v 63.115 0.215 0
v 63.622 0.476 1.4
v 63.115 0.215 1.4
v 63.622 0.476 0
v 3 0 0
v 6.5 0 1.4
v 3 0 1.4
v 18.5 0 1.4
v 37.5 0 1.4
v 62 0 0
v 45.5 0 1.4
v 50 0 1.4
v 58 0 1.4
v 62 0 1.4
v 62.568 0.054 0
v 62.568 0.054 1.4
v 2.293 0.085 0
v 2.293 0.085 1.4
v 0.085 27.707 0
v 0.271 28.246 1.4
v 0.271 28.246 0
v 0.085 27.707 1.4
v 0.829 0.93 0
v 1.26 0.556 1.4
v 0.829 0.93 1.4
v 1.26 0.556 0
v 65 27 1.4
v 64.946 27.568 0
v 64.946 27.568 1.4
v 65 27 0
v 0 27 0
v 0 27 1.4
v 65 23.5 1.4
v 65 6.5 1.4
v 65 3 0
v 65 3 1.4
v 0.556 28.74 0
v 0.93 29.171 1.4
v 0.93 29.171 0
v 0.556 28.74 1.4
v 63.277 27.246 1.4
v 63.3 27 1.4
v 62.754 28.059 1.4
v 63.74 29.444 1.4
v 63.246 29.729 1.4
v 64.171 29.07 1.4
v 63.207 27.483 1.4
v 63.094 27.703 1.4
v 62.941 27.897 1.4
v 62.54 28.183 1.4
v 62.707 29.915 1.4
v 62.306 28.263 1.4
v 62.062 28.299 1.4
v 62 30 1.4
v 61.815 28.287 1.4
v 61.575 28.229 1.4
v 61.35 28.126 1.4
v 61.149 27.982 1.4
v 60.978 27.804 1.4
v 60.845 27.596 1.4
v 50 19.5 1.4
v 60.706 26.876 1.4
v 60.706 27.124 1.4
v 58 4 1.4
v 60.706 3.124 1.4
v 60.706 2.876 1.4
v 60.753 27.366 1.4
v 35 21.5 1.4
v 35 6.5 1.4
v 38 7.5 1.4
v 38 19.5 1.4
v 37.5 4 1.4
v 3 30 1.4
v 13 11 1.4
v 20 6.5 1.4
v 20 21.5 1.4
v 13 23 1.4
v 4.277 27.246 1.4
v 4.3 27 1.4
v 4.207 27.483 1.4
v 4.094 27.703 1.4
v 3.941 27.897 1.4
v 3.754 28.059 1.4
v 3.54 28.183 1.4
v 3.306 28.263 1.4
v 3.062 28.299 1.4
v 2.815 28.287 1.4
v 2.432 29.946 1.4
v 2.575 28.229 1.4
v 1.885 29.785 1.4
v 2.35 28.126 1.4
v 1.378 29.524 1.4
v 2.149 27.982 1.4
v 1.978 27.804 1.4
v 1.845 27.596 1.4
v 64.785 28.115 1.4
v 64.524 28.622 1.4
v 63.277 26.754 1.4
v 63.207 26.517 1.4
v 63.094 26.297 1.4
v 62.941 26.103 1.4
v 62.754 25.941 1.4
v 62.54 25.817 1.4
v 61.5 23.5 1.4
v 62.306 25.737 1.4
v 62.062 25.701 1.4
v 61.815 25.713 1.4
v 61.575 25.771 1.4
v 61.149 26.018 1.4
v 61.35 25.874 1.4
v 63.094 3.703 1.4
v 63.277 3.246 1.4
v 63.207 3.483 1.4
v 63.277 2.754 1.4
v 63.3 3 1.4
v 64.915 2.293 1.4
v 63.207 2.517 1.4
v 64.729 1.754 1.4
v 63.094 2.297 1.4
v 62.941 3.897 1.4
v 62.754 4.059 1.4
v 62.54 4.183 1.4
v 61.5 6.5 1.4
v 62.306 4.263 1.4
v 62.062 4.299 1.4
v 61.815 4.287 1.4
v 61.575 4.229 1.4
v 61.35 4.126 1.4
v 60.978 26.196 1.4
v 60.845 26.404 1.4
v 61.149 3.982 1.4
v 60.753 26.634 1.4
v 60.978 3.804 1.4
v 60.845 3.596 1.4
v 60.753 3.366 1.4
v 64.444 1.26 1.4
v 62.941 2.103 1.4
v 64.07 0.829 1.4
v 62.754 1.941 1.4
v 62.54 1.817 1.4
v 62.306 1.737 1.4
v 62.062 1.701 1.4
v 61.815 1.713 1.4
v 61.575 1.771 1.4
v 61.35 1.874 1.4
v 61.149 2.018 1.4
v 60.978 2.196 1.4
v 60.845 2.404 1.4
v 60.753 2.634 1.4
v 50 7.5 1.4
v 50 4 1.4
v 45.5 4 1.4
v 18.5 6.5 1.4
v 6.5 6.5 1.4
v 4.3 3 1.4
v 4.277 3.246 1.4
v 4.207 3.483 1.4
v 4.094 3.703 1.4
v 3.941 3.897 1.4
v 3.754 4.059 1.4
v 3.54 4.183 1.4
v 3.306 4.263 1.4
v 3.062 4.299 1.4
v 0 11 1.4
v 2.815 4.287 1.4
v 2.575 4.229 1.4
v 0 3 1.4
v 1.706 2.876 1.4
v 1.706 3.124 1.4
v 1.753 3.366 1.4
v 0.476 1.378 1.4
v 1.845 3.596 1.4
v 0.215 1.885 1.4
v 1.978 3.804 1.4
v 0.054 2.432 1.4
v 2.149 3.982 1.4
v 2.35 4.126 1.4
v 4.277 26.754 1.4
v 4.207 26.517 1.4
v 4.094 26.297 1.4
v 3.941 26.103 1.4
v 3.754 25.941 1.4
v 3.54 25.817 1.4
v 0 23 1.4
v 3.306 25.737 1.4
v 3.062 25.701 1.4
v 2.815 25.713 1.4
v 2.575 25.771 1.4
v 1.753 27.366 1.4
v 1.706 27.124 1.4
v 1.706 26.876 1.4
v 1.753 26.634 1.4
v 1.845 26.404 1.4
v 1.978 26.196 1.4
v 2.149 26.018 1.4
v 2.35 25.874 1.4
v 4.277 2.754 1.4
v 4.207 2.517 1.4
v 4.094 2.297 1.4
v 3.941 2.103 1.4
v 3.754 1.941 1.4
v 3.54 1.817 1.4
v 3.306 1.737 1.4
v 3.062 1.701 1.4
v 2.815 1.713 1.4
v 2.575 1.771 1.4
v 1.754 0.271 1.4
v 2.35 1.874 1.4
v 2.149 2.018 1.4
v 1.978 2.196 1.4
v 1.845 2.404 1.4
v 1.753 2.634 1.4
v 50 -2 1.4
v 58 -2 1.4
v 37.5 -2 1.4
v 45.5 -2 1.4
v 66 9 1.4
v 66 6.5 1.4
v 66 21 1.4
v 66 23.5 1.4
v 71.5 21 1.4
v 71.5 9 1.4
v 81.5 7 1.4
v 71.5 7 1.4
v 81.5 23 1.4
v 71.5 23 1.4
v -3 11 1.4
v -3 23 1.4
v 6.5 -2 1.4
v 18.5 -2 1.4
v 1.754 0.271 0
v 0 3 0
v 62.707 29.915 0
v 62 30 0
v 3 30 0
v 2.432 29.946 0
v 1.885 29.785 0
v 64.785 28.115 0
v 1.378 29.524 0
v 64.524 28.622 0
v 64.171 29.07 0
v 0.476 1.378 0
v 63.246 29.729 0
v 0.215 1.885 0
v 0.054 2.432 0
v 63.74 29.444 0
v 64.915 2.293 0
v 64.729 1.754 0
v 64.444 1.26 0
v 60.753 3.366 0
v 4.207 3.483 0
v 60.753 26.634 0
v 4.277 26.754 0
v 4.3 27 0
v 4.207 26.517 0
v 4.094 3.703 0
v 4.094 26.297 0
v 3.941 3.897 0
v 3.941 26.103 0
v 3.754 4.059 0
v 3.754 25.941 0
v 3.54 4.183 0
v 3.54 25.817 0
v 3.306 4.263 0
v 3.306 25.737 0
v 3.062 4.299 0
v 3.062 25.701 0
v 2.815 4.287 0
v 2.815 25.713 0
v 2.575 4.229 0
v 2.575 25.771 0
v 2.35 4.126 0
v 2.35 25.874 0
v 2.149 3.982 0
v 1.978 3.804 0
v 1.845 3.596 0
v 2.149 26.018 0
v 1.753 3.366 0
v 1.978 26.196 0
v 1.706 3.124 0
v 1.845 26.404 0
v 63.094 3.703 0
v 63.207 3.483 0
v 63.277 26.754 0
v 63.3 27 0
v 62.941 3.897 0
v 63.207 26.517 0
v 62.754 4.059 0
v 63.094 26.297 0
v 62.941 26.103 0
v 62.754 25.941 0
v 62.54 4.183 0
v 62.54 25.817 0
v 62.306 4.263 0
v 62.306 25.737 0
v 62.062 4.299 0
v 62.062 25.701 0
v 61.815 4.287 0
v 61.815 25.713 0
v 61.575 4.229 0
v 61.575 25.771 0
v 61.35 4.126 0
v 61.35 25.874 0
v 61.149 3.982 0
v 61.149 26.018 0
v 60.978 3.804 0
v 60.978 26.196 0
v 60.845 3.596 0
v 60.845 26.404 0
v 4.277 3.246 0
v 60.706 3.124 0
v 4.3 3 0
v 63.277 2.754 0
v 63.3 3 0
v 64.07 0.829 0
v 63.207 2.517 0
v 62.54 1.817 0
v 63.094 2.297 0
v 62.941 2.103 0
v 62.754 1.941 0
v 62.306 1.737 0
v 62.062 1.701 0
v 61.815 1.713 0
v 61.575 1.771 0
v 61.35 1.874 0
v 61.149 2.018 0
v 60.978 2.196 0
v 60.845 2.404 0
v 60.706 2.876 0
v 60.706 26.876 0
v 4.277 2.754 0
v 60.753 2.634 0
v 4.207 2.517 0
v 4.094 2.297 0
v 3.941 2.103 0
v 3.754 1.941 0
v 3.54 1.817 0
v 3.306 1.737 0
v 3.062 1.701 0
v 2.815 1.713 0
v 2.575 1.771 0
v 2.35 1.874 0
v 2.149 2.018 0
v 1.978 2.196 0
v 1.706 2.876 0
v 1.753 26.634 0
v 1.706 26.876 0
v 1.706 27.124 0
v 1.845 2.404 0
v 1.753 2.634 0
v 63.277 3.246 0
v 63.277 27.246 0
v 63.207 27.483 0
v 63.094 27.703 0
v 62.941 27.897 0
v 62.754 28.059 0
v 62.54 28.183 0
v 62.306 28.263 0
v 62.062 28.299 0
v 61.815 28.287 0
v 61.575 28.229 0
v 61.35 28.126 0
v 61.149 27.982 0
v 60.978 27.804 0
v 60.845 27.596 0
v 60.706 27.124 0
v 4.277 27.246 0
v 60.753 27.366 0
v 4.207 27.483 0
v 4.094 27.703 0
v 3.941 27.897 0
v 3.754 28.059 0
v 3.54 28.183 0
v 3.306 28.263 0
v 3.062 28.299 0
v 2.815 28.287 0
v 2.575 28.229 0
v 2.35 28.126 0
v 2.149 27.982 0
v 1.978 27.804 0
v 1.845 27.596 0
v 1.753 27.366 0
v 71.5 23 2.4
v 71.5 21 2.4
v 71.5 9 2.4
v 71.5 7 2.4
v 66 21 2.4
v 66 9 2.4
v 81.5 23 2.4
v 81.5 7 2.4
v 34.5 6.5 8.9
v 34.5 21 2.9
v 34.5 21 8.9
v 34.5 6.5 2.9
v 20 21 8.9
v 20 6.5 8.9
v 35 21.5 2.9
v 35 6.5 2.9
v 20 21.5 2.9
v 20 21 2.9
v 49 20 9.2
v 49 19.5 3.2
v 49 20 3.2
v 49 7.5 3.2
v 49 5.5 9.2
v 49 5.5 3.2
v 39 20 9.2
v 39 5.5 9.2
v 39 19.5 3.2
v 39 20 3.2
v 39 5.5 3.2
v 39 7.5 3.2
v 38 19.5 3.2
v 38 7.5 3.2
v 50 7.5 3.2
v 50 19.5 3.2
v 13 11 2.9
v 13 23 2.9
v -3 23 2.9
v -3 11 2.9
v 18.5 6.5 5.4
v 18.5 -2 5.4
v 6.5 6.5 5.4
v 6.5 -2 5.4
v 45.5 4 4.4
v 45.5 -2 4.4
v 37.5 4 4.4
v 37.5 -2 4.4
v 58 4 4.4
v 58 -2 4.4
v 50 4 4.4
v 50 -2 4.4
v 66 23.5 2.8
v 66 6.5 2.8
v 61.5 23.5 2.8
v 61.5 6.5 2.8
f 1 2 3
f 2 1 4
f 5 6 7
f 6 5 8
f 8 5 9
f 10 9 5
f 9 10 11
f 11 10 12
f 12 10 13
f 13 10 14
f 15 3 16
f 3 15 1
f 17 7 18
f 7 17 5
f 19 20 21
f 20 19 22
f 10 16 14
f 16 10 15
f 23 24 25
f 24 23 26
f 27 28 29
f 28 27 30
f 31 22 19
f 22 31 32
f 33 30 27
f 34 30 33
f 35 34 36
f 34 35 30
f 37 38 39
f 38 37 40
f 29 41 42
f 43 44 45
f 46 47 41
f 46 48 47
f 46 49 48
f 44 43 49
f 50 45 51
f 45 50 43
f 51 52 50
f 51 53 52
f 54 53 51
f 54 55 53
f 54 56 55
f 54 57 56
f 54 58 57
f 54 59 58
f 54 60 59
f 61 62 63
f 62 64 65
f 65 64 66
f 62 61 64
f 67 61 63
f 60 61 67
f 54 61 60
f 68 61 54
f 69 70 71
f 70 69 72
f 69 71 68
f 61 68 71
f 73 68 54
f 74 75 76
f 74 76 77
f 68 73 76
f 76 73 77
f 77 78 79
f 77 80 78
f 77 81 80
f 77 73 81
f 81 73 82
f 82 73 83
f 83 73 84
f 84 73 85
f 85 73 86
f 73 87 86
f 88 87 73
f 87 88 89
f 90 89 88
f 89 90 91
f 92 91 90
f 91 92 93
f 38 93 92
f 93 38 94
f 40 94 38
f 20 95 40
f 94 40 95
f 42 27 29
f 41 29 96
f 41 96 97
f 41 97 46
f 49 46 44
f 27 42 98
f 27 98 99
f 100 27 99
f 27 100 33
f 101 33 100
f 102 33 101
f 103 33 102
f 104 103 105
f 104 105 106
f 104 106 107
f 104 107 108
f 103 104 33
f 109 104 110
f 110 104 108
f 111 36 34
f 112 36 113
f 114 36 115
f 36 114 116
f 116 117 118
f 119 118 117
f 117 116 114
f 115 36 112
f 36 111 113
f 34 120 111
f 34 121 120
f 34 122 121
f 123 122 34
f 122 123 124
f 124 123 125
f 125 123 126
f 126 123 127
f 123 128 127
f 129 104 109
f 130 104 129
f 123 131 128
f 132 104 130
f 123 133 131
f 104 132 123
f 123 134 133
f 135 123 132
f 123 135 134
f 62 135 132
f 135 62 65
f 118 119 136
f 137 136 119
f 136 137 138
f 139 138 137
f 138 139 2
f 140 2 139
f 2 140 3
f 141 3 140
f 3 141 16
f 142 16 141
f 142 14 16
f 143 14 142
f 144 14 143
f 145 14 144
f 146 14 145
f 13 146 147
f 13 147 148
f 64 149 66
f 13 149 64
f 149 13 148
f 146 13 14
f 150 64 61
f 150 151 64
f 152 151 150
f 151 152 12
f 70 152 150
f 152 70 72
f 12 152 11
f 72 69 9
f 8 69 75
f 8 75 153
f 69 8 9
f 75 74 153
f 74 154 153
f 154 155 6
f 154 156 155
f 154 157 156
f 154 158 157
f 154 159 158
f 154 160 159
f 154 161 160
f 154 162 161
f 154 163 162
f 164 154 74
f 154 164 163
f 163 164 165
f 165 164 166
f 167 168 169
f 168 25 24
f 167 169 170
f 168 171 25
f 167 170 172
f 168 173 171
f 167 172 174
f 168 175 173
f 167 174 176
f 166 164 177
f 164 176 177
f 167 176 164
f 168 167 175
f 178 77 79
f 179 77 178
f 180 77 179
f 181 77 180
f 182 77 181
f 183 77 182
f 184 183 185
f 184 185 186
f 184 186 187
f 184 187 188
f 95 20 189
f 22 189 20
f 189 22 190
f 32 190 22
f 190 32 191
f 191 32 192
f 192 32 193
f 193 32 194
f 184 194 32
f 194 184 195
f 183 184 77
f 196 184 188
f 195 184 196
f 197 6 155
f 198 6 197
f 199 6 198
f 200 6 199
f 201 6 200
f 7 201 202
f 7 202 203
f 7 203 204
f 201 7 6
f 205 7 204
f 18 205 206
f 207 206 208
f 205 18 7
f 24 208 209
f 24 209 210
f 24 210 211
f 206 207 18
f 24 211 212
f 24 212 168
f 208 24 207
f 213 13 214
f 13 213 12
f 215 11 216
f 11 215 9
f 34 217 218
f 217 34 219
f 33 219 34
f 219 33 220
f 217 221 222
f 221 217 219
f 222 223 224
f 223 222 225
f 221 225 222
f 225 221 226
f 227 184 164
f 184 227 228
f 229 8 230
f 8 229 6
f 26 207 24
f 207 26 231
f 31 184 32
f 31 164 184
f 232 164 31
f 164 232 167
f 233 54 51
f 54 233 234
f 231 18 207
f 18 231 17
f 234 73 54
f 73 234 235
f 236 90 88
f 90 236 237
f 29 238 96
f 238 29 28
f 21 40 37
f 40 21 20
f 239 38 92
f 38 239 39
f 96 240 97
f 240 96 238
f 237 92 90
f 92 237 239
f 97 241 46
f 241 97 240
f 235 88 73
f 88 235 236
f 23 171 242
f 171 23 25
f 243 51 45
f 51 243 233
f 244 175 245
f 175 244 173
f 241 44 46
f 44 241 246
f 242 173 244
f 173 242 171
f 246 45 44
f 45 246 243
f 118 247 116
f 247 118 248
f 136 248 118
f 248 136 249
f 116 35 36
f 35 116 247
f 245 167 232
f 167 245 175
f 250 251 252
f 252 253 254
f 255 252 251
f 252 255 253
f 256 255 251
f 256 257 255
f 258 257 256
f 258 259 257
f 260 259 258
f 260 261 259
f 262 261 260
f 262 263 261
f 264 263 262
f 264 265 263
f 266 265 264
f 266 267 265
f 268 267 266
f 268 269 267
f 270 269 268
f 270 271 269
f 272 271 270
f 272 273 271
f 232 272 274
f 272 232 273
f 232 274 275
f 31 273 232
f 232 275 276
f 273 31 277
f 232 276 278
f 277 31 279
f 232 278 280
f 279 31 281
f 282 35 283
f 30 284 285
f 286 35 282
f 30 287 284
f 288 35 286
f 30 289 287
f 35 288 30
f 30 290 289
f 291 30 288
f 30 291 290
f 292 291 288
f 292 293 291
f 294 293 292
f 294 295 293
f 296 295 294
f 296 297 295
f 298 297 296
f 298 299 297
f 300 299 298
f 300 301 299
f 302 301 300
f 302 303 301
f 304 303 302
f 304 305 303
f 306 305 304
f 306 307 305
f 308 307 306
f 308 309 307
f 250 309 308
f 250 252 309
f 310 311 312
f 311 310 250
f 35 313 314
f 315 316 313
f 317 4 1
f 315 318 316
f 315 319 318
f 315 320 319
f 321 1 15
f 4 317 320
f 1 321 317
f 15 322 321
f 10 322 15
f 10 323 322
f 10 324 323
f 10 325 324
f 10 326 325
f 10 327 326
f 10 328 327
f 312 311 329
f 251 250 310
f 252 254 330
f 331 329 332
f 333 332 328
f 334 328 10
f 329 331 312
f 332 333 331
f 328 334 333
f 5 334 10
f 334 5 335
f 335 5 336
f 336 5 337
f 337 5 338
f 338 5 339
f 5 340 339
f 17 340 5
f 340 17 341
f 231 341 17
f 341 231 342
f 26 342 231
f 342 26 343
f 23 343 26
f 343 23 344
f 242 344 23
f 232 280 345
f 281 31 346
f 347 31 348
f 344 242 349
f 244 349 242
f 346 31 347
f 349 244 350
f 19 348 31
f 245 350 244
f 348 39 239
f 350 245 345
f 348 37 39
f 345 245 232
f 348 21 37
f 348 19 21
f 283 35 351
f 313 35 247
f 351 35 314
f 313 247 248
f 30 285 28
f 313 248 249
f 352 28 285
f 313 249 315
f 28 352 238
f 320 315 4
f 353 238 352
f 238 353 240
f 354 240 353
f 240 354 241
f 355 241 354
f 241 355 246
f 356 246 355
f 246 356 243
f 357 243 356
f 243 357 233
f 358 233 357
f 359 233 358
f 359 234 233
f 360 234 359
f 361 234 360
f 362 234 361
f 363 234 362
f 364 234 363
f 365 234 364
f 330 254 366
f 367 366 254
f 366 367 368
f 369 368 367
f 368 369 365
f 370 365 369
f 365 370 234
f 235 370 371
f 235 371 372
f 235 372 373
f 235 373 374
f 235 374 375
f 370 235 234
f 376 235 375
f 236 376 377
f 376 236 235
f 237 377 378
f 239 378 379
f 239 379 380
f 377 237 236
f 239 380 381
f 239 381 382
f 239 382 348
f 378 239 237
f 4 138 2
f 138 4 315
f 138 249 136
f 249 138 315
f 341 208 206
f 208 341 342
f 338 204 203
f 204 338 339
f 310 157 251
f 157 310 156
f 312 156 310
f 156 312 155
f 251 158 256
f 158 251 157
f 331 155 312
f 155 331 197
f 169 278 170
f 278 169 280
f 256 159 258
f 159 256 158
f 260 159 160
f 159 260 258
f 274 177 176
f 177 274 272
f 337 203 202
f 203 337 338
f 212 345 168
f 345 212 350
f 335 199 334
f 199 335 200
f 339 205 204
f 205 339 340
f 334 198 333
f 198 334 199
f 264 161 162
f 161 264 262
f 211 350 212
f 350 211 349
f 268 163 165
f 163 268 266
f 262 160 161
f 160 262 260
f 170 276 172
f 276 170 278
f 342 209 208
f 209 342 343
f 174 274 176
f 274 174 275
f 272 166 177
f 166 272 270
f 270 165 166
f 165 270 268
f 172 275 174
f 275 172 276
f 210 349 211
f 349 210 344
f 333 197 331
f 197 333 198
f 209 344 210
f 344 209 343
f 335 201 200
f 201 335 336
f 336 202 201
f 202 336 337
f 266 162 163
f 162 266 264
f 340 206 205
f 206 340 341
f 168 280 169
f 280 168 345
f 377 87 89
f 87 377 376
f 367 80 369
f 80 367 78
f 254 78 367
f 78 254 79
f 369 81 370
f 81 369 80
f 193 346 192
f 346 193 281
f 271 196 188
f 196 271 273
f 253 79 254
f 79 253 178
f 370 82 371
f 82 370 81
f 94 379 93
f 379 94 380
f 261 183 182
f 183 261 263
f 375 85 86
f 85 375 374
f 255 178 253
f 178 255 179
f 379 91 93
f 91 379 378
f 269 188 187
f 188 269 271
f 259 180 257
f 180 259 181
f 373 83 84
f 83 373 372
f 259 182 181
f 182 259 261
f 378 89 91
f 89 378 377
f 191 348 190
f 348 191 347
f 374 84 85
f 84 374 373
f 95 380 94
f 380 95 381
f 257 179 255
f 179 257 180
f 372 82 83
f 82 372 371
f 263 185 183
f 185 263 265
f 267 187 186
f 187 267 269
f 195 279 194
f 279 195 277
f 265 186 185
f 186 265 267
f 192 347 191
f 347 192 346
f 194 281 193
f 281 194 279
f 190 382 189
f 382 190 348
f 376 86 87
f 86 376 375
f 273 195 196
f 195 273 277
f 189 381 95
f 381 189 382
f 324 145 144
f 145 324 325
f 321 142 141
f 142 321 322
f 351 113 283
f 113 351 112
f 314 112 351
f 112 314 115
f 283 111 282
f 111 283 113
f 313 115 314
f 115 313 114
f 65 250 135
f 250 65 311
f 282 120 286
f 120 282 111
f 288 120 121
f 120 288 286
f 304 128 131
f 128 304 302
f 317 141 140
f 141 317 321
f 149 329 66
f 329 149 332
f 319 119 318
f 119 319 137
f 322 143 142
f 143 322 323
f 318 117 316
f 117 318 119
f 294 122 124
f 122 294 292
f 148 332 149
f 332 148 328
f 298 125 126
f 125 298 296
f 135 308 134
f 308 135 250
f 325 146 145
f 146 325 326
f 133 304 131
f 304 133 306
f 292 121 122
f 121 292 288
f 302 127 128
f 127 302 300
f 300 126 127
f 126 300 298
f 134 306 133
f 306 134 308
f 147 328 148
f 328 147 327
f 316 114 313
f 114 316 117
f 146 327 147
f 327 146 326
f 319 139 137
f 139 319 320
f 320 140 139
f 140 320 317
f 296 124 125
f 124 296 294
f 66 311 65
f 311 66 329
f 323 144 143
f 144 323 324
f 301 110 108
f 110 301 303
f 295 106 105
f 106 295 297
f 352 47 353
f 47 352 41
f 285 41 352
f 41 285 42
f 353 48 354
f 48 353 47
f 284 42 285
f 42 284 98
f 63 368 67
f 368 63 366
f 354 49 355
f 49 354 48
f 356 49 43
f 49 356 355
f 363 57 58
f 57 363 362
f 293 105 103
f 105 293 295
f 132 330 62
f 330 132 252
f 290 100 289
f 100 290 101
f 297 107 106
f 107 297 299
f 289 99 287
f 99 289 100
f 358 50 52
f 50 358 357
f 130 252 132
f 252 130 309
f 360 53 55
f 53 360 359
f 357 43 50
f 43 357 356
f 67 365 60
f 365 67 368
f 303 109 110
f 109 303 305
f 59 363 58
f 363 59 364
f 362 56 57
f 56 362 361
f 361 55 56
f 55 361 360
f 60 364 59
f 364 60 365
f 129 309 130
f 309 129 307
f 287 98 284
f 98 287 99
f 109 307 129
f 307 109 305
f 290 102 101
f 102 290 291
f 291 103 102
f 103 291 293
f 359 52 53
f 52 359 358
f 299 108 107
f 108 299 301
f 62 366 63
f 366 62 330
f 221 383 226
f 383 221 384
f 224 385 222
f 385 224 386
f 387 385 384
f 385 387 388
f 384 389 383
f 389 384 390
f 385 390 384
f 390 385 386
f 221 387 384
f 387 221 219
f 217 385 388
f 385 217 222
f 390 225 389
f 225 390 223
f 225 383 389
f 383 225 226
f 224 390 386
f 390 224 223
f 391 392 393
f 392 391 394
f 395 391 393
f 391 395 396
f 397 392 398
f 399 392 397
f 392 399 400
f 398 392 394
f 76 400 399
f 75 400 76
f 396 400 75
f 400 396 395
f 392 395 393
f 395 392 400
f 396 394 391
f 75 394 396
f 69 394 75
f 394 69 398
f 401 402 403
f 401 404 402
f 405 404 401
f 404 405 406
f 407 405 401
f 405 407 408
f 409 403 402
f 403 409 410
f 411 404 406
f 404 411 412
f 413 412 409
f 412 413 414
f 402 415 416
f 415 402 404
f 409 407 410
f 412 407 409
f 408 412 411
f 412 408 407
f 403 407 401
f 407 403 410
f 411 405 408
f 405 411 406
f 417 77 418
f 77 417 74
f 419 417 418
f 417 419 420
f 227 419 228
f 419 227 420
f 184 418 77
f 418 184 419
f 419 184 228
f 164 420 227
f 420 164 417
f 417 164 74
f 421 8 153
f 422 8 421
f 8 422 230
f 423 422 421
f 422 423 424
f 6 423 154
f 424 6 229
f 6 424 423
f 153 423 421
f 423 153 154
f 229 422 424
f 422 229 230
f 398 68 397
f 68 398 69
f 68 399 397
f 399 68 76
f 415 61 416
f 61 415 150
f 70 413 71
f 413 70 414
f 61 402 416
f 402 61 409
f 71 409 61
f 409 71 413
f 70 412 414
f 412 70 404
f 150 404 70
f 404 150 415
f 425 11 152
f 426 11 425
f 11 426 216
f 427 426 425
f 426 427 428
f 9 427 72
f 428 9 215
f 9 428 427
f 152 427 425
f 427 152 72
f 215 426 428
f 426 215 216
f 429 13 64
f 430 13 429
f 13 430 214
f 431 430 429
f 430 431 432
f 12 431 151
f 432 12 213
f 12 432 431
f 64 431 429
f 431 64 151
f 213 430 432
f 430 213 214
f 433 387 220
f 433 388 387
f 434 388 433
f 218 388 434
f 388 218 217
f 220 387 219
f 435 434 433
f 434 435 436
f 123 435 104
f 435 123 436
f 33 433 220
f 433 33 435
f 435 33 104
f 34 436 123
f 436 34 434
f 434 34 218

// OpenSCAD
//======================================================================
// pi0.scad
//
// This is a Raspberry Pi Zero W 2
// Beware that heat sinks may be slightly misplaced, leave extra space!
// TODO: Mounting holes are off a bit.
//
// DrTomFlint, 19 Oct 2024
//======================================================================

rPi=3.0;       // radius of pcb corners
thick=1.4;    // pcb thickness
xPi=65.0;
yPi=30.0;  

F2=33;

//----------------------------------------------------------------------
module pi0(cam=10,heatsink=1){

  
  // pcb
  translate([rPi,rPi,0])
  difference(){
    linear_extrude(height=thick)
    offset(r=rPi,$fn=F2)
    square([xPi-2*rPi,yPi-2*rPi]);

    // mounting holes  
    translate([0,0,0])
    cylinder(r=1.3,h=4*thick,center=true,$fn=F2);
    translate([0,yPi-2*rPi,0])
    cylinder(r=1.3,h=4*thick,center=true,$fn=F2);
    translate([xPi-2*rPi,0,0])
    cylinder(r=1.3,h=4*thick,center=true,$fn=F2);
    translate([xPi-2*rPi,yPi-2*rPi,0])
    cylinder(r=1.3,h=4*thick,center=true,$fn=F2);
  }
  
  // SD card
  translate([-3,11,thick])
  cube([16,12,1.5]);
  
  // HDMI
  translate([6.5,-2,thick])
  cube([12,8.5,4]);
  
  // RP3A0-AU Processor
  translate([20,6.5,thick])
  cube([15,15,1.5]);
  
  // RF chip
  translate([38,7.5,thick])
  cube([12,12,1.8]);
  
  // USB OTG
  translate([37.5,-2,thick])
  cube([8,6,3]);
  
  // USB Power
  translate([50,-2,thick])
  cube([8,6,3]);
  
  // CSI 
  translate([61.5,6.5,thick])
  cube([4.5,17,1.4]);
  
  // Camera cable
  if(cam>0){
    // narrow section
    translate([xPi,9,thick])
    cube([6.5,12,1]);    
    // wider section
    translate([xPi+6.5,7,thick])
    cube([cam,16,1]);    
  }
  
  // 
  if(heatsink==1){
    // Processor heatsink
    translate([20,6.5,thick+1.5])
    cube([14.5,14.5,6]);    
    // RF heatsink
    translate([38+1,7.5-2,thick+1.8])
    cube([10,14.5,6]);    
  }
  
}

//======================================================================

pi0();

//======================================================================
